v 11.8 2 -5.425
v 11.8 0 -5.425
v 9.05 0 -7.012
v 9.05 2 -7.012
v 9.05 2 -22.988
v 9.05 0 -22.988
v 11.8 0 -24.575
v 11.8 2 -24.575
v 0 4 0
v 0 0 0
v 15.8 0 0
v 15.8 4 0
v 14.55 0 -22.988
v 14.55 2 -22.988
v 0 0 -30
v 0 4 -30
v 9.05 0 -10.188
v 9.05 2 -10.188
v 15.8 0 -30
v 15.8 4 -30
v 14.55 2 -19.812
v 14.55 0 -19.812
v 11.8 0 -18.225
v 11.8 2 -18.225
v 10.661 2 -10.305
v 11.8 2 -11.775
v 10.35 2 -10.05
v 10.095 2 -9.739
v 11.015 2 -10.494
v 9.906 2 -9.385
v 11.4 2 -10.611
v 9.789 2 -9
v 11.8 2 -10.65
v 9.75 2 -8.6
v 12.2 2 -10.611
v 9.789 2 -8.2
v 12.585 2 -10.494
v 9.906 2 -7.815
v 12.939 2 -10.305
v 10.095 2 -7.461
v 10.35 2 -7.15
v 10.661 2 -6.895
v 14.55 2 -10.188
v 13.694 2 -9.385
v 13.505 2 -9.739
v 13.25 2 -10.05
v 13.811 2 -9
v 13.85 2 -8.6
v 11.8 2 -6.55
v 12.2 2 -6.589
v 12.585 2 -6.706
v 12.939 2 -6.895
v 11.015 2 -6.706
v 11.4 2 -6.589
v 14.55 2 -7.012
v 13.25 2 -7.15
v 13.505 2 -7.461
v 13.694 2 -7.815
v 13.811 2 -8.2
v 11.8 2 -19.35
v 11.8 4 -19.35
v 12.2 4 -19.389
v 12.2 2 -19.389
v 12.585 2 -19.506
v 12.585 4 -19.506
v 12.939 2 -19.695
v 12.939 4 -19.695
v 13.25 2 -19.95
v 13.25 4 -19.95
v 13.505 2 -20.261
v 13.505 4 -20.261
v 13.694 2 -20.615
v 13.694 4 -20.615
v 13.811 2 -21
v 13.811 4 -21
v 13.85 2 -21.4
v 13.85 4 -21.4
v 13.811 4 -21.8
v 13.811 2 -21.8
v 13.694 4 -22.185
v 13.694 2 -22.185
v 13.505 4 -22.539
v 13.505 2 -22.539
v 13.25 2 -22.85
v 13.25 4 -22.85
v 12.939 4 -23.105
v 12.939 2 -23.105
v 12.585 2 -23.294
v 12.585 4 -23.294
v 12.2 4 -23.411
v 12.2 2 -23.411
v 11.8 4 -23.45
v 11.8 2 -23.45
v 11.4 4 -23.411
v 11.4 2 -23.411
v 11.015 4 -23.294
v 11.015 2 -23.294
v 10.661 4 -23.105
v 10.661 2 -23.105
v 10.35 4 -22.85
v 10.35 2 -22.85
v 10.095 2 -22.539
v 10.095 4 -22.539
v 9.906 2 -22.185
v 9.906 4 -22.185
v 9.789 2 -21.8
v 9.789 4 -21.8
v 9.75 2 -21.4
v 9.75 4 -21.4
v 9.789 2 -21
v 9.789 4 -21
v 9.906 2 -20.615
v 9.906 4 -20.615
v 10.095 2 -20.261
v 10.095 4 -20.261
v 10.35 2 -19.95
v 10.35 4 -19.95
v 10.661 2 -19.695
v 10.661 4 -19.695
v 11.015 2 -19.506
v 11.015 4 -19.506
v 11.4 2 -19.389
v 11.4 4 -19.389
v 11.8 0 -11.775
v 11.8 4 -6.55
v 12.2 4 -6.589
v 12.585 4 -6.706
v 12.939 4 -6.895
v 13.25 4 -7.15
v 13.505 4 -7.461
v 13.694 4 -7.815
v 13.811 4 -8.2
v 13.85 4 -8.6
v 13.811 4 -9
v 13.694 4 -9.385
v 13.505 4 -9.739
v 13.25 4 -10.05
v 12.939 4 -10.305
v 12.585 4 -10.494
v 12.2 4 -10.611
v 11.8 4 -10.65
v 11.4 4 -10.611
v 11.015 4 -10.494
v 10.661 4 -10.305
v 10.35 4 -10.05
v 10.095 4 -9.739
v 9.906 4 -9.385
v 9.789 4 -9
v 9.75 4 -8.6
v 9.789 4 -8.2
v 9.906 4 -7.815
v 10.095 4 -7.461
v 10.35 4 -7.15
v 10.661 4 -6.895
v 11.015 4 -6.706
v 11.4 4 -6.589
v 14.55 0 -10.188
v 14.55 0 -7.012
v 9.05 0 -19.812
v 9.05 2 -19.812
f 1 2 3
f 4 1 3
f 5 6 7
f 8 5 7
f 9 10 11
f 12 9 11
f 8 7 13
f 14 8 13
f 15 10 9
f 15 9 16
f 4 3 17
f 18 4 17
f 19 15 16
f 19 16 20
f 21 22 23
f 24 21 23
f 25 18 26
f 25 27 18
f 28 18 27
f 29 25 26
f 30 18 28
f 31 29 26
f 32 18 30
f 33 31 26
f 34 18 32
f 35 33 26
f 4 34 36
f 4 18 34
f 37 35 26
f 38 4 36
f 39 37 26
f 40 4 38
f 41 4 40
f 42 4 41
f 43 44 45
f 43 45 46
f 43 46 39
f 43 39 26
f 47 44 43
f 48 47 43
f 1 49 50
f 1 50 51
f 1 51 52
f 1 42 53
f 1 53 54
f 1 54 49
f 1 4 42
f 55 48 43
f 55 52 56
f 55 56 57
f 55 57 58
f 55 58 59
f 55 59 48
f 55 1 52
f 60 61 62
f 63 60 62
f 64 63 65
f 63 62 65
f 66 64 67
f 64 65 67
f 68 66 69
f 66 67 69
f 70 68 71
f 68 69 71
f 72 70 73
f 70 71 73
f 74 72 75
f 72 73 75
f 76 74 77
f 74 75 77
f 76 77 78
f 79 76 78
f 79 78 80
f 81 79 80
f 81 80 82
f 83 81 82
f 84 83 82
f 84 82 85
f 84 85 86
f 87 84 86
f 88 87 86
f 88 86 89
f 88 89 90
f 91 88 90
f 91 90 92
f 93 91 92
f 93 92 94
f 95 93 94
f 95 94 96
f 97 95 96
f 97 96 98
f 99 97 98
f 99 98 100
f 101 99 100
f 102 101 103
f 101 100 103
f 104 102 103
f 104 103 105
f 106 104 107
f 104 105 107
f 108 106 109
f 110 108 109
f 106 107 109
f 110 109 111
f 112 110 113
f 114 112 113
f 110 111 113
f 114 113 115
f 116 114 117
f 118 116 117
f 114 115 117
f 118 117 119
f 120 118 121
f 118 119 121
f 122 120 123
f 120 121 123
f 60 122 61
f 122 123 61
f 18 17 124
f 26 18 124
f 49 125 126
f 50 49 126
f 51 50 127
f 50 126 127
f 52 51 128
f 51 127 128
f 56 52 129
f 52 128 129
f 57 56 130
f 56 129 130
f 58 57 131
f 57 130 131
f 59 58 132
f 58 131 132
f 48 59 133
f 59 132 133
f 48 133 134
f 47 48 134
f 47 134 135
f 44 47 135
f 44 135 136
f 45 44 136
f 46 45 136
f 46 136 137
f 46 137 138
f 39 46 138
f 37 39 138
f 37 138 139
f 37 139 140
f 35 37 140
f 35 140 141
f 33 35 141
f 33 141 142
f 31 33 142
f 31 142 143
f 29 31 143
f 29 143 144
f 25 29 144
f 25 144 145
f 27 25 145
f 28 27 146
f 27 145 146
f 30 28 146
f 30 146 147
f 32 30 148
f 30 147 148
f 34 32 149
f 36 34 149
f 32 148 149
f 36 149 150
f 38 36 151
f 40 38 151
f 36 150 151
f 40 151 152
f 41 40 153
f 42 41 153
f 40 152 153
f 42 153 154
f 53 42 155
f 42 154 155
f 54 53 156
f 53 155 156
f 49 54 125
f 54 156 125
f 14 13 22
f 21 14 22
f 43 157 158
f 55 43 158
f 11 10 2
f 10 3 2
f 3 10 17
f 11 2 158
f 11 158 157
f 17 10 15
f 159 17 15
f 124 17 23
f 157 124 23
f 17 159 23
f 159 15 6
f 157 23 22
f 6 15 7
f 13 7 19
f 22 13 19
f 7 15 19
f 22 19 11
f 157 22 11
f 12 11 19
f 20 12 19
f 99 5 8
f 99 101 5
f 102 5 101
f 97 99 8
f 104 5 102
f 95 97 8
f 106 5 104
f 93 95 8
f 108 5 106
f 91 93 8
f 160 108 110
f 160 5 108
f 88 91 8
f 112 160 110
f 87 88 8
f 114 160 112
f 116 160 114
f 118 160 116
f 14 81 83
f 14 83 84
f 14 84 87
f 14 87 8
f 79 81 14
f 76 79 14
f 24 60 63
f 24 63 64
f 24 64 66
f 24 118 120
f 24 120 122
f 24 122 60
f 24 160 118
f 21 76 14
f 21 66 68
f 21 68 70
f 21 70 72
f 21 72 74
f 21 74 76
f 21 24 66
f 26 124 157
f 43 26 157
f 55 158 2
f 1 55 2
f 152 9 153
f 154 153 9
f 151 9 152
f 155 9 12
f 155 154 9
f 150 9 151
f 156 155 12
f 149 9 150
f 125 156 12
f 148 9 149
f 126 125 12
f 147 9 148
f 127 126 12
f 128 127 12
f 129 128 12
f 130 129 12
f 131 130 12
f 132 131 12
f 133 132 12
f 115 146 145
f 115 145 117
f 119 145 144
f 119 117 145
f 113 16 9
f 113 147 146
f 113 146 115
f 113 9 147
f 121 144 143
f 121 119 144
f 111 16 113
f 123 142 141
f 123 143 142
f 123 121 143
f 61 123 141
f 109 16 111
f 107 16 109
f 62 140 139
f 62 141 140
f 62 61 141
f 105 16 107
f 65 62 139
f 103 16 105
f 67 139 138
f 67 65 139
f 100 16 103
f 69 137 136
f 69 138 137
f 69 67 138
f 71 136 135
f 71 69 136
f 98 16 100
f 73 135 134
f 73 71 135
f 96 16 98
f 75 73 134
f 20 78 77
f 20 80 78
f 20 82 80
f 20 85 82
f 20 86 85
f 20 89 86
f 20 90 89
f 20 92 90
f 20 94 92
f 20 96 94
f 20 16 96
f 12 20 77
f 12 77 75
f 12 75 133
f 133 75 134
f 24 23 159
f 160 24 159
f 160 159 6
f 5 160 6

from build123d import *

# Parameters (mm, degrees)
SKETCH_1_W          = 15.8
SKETCH_1_H          = 30
EXTRUDE_1_DEPTH     = 4
SKETCH_2_R          = 2.05
CUT_EXTRUDE_1_DEPTH = 35.141470384
CUT_EXTRUDE_2_DEPTH = 2


with BuildPart() as part:
    # 草图1 → 凸台-拉伸1 (new body)
    with BuildSketch(Plane(origin=(0, 0, 0), x_dir=(1, 0, 0), z_dir=(0, 1, 0))):
        with Locations((7.9, 15)):
            Rectangle(SKETCH_1_W, SKETCH_1_H)
    extrude(amount=EXTRUDE_1_DEPTH)

    # 草图2 → 切除-拉伸1 (cut, through all)
    with BuildSketch(Plane(origin=(0, 4, 0), x_dir=(1, 0, 0), z_dir=(0, 1, 0))):
        with Locations((11.8, 21.4)):
            Circle(SKETCH_2_R)
        with Locations((11.8, 8.6)):
            Circle(SKETCH_2_R)
    extrude(amount=-CUT_EXTRUDE_1_DEPTH, mode=Mode.SUBTRACT)

    # 草图5 → 切除-拉伸2 (cut)
    with BuildSketch(Plane.XZ):
        Polygon((14.55, -7.01228676), (11.8, -5.424573519), (9.05, -7.01228676), (9.05, -10.18771324), (11.8, -11.775426481), (14.55, -10.18771324), align=None)
        Polygon((9.05, -22.98771324), (11.8, -24.575426481), (14.55, -22.98771324), (14.55, -19.81228676), (11.8, -18.224573519), (9.05, -19.81228676), align=None)
    extrude(amount=-CUT_EXTRUDE_2_DEPTH, mode=Mode.SUBTRACT)


solid = part.part
